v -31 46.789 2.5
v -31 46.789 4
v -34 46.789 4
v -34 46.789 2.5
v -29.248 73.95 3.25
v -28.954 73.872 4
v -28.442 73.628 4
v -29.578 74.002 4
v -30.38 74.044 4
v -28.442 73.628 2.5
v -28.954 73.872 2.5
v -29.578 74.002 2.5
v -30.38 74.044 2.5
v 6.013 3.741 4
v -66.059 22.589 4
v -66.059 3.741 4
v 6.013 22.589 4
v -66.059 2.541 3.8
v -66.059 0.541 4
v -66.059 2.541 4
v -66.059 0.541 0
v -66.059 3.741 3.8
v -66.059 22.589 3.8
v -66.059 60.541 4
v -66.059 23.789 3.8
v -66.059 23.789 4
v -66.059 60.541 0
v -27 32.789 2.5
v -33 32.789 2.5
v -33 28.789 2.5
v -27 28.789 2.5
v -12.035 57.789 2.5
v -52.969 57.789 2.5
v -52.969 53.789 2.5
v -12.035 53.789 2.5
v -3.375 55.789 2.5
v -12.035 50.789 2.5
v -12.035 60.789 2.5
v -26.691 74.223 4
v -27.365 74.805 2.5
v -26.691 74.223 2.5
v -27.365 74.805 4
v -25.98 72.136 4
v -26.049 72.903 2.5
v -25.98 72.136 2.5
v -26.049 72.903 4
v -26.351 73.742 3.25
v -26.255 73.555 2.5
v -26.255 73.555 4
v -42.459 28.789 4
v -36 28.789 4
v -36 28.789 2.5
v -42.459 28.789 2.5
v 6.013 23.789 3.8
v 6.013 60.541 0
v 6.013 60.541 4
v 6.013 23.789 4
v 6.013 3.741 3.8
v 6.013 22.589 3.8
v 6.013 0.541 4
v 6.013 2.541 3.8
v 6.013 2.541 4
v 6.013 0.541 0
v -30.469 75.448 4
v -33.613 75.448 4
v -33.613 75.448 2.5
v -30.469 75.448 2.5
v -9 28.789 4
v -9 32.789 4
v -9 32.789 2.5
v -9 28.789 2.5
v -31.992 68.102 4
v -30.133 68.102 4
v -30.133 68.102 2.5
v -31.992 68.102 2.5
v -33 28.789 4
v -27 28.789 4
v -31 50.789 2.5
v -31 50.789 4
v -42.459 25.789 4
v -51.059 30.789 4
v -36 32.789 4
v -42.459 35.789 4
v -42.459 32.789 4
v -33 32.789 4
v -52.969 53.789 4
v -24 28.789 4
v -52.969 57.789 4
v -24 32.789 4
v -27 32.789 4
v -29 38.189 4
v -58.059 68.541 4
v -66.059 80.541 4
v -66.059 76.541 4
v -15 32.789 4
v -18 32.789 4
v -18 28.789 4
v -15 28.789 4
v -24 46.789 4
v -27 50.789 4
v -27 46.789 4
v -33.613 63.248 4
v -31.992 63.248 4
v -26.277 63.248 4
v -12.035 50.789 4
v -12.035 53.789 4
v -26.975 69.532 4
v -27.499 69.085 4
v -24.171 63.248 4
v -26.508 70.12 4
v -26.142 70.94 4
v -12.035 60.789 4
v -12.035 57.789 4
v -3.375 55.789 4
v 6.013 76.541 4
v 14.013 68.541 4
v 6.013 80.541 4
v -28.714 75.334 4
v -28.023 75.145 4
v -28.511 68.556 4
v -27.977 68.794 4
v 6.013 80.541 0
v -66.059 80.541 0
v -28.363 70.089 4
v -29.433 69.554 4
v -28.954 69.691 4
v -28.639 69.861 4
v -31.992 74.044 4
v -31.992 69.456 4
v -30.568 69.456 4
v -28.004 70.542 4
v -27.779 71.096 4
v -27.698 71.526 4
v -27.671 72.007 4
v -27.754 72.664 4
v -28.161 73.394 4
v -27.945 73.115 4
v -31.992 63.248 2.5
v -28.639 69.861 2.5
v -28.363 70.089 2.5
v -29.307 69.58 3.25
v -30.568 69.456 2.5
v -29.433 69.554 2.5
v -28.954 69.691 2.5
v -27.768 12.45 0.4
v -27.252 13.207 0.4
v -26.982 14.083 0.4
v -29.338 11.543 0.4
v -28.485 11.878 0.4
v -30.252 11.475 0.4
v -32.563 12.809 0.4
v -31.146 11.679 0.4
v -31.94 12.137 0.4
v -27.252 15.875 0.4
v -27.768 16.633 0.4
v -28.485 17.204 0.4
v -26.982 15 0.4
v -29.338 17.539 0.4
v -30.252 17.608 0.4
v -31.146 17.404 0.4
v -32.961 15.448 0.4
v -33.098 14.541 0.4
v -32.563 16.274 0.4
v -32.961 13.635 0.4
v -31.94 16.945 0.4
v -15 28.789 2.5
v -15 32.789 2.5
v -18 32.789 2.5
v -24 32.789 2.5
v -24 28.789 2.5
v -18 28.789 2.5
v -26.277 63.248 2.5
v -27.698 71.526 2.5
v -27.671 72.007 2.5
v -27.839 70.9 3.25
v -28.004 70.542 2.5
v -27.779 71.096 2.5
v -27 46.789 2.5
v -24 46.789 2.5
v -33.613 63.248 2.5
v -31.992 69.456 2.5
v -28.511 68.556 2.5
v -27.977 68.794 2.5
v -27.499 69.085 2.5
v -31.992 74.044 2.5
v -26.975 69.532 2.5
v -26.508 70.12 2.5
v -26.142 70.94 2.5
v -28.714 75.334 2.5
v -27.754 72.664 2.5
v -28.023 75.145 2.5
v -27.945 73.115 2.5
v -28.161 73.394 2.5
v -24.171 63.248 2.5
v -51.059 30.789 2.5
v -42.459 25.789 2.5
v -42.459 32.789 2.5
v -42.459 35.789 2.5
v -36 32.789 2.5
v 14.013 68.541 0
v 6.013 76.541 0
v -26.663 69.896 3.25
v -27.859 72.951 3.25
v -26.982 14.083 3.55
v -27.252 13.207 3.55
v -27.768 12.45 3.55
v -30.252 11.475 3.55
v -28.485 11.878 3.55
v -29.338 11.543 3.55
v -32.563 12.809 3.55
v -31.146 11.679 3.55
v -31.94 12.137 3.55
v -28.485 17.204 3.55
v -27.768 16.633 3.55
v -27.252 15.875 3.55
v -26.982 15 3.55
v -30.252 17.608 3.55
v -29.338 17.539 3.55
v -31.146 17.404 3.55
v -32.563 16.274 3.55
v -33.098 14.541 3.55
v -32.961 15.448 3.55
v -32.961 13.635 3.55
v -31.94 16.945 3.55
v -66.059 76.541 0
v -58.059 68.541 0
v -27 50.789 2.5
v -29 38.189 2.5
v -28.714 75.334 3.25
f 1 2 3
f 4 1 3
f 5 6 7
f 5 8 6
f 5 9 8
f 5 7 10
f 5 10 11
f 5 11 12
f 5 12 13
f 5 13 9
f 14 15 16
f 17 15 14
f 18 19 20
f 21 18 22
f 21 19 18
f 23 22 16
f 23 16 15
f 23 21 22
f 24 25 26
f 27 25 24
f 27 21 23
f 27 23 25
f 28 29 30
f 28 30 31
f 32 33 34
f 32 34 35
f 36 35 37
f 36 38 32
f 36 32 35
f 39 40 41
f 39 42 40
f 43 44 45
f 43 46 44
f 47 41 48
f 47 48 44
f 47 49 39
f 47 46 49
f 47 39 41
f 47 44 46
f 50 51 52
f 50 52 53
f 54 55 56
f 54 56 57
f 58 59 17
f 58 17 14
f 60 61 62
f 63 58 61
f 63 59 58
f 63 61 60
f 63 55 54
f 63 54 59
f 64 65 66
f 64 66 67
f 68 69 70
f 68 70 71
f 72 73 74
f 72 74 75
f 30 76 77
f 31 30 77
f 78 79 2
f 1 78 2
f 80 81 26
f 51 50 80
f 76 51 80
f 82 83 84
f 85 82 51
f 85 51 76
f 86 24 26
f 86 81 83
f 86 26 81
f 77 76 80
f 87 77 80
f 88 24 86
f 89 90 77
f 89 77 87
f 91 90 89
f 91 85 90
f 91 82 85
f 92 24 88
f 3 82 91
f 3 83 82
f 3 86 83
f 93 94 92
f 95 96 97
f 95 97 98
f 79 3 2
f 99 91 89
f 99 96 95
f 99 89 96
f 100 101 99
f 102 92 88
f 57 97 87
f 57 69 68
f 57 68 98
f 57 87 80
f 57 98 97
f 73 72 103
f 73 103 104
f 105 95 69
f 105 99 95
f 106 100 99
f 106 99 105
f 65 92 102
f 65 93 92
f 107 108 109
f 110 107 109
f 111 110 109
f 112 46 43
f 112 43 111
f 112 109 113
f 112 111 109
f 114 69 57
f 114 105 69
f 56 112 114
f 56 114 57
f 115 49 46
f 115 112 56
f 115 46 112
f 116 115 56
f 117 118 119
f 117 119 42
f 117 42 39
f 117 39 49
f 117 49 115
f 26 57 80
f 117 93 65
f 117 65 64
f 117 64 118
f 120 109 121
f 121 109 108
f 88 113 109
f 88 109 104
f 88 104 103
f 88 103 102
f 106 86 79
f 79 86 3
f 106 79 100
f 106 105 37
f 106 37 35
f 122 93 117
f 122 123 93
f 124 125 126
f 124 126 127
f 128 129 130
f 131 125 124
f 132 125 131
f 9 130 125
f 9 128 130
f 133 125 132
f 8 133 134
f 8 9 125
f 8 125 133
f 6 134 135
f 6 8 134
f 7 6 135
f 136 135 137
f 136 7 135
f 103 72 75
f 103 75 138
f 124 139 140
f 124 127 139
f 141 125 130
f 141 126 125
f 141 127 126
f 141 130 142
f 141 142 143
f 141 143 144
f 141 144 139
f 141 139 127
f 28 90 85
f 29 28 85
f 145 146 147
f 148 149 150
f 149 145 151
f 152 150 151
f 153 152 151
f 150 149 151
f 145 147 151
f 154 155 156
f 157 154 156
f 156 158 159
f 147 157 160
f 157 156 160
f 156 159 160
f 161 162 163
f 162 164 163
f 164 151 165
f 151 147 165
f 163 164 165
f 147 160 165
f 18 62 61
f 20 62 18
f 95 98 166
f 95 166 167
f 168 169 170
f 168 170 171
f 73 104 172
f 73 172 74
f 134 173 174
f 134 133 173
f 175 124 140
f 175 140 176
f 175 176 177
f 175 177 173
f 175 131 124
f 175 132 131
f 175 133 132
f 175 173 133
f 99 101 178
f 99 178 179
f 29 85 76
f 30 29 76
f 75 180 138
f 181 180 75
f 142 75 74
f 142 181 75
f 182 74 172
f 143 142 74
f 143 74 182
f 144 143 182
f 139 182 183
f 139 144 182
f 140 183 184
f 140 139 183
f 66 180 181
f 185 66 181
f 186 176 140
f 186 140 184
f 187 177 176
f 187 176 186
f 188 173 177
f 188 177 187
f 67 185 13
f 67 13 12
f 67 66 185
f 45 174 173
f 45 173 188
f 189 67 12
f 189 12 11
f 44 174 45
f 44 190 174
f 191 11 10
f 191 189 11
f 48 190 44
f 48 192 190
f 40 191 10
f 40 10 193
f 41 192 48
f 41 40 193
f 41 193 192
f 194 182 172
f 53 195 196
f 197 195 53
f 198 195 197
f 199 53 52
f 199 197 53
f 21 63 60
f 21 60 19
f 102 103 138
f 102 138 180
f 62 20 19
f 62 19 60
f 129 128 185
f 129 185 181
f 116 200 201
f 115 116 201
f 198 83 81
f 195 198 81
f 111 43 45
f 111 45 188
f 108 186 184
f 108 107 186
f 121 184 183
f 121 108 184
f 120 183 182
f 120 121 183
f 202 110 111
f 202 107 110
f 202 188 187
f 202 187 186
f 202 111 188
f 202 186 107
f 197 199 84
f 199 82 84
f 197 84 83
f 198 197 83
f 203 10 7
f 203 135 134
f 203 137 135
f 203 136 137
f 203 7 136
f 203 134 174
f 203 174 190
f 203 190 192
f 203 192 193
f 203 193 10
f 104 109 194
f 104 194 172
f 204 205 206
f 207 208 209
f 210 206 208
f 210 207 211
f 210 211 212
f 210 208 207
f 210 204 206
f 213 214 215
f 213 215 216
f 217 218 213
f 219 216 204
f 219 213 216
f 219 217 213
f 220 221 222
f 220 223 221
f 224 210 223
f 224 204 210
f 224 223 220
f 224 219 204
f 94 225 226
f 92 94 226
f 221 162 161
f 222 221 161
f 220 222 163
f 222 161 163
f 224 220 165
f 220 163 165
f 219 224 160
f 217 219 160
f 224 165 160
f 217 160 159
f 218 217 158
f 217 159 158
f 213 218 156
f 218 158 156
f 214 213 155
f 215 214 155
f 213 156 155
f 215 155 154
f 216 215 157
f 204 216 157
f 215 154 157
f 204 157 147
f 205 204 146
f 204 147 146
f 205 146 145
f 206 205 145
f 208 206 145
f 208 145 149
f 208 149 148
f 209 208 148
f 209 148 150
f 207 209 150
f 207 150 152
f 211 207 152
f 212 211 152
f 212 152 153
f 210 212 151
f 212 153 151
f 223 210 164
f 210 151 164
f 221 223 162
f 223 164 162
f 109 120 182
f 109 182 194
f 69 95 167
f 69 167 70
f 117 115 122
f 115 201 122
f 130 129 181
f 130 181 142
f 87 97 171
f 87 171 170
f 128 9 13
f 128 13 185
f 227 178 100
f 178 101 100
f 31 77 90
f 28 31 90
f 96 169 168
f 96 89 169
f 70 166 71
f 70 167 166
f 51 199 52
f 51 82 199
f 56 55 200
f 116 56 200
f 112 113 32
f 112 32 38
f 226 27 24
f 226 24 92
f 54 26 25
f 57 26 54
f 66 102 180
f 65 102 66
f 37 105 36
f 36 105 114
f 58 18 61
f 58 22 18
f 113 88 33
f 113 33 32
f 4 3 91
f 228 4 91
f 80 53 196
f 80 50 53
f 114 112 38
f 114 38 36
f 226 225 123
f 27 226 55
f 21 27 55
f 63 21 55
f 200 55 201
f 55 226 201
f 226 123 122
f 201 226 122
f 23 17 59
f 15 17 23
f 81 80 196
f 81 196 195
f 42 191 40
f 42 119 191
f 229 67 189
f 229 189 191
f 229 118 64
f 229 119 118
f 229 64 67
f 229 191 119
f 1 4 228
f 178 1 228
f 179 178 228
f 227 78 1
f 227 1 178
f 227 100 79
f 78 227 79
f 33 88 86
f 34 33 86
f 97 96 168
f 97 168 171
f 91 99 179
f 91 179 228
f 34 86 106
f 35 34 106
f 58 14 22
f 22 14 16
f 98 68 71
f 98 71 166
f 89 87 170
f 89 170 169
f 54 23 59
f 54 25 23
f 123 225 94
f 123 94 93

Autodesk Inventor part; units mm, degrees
ref_plane "YZ Plane" through (0, 0, 0) normal (1, 0, 0) x (0, 1, 0)
ref_plane "XZ Plane" through (0, 0, 0) normal (0, 1, 0) x (-1, 0, 0)
sketch "Sketch1" plane through (0, 0, 0) normal (0, 0, 1) x (1, 0, 0)
  line L0 (6.0134, 0.5413) -> (-66.0587, 0.5413)
  circle A0 centre (-66.0587, 68.5413) radius 8 construction
  line L1 (-66.0587, 60.5413) -> (6.0134, 60.5413) construction
  line L2 (-66.0587, 76.5413) -> (-58.0587, 68.5413)
  line L3 (-66.0587, 60.5413) -> (-58.0587, 68.5413)
  line L4 (6.0134, 60.5413) -> (6.0134, 0.5413)
  line L5 (-66.0587, 0.5413) -> (-66.0587, 60.5413)
  line L6 (-66.0587, 76.5413) -> (-66.0587, 80.5413)
  line L7 (6.0134, 0.5413) -> (-120, 0.5413) construction
  line L8 (-60, 0) -> (-60, 75) construction
  line L9 (-60, 75) -> (0, 75) construction
  line L10 (6.0134, 150.5413) -> (6.0134, 0.5413) construction
  line L11 (6.0134, 60.5413) -> (6.0134, 80.5413)
  line L12 (-66.0587, 80.5413) -> (6.0134, 80.5413)
  line L13 (-66.0587, 76.5413) -> (12.8048, 76.5413) construction
  line L14 (-58.0587, 68.5413) -> (17.3629, 68.5413) construction
  line L15 (-66.0587, 60.5413) -> (24.3855, 60.5413) construction
  circle A1 centre (6.0134, 68.5413) radius 8 construction
  line L16 (6.0134, 60.5413) -> (14.0134, 68.5413)
  line L17 (14.0134, 68.5413) -> (6.0134, 76.5413)
  point P0 (0, 0)
  dimension "d1" = 80
  dimension "d5" = 16
  dimension "d6" = 60
extrude "Extrusion1" add sketch "Sketch1" along normal blind 4
sketch "Sketch3" plane through (0, 0, 4) normal (0, 0, 1) x (1, 0, 0)
  line L0 (-66.0587, 80.5413) -> (13.9413, 80.5413) construction
  line L1 (-34.8487, 75.4475) -> (-28.5043, 75.4475) construction
  line L2 (-28.5043, 75.4475) -> (-28.5043, 84.7097) construction
  line L3 (-28.5043, 84.7097) -> (-34.8487, 84.7097) construction
  line L4 (-34.8487, 84.7097) -> (-34.8487, 75.4475) construction
  line L5 (-52.9694, 57.7889) -> (-12.0353, 57.7889)
  line L6 (-12.0353, 57.7889) -> (-12.0353, 60.7889)
  line L7 (-12.0353, 60.7889) -> (-3.3751, 55.7889)
  line L8 (-12.0353, 50.7889) -> (-3.3751, 55.7889)
  line L9 (-12.0353, 50.7889) -> (-12.0353, 53.7889)
  line L10 (-52.9694, 53.7889) -> (-12.0353, 53.7889)
  line L11 (-52.9694, 57.7889) -> (-52.9694, 53.7889)
  line L12 (-27, 50.7889) -> (-31, 50.7889)
  line L13 (-31, 50.7889) -> (-31, 46.7889)
  line L14 (-27, 46.7889) -> (-27, 50.7889)
  line L15 (-27, 50.7889) -> (-27, 52.7889) construction
  line L16 (-27, 35.7889) -> (-27, 32.7889) construction
  line L17 (-27, 32.7889) -> (-33, 32.7889)
  line L18 (-33, 32.7889) -> (-33, 28.7889)
  line L19 (-33, 28.7889) -> (-27, 28.7889)
  line L20 (-27, 28.7889) -> (-27, 32.7889)
  line L21 (-33, 32.7889) -> (-36, 32.7889) construction
  line L22 (-36, 32.7889) -> (-36, 28.7889)
  line L23 (-36, 32.7889) -> (-42.4587, 32.7889)
  line L24 (-42.4587, 32.7889) -> (-42.4587, 35.7889)
  line L25 (-42.4587, 35.7889) -> (-51.0587, 30.7889)
  line L26 (-36, 28.7889) -> (-42.4587, 28.7889)
  line L27 (-42.4587, 28.7889) -> (-42.4587, 25.7889)
  line L28 (-42.4587, 25.7889) -> (-51.0587, 30.7889)
  line L29 (6.0134, 0.5413) -> (-66.0587, 0.5413) construction
  line L30 (-66.0587, 80.5413) -> (6.0134, 80.5413) construction
  line L31 (-30.0226, 80.5413) -> (-30.0226, 0.5413) construction
  line L32 (-24, 32.7889) -> (-18, 32.7889)
  line L33 (-18, 32.7889) -> (-18, 28.7889)
  line L34 (-18, 28.7889) -> (-24, 28.7889)
  line L35 (-24, 28.7889) -> (-24, 32.7889)
  line L36 (-15, 32.7889) -> (-9, 32.7889)
  line L37 (-9, 32.7889) -> (-9, 28.7889)
  line L38 (-9, 28.7889) -> (-15, 28.7889)
  line L39 (-15, 28.7889) -> (-15, 32.7889)
  line L40 (-27, 46.7889) -> (-24, 46.7889)
  line L41 (-31, 46.7889) -> (-34, 46.7889)
  line L42 (-66.0587, 0.5413) -> (-66.0587, 60.5413) construction
  line L43 (6.0134, 60.5413) -> (6.0134, 0.5413) construction
  line L44 (-29, 50.7889) -> (-29, 38.1889) construction
  line L45 (-34, 46.7889) -> (-29, 38.1889)
  line L46 (-24, 46.7889) -> (-29, 38.1889)
  line L47 (-24.1712, 63.2475) -> (-26.277, 63.2475)
  line L48 (-26.277, 63.2475) -> (-30.1328, 68.1018)
  line L49 (-30.1328, 68.1018) -> (-31.9915, 68.1018)
  line L50 (-31.9915, 68.1018) -> (-31.9915, 63.2475)
  line L51 (-31.9915, 63.2475) -> (-33.6129, 63.2475)
  line L52 (-33.6129, 63.2475) -> (-33.6129, 75.4475)
  line L53 (-33.6129, 75.4475) -> (-30.4689, 75.4475)
  spline S0 degree 2 poles (-30.4689, 75.4475) (-29.421, 75.4475) (-28.0072, 75.2201) (-27.3646, 74.8048) knots 0 0 0 1 2 2 2
  spline S1 degree 2 poles (-27.3646, 74.8048) (-26.7219, 74.3896) (-25.9804, 73.0945) (-25.9804, 72.1355) knots 0 0 0 1 2 2 2
  spline S2 degree 2 poles (-25.9804, 72.1355) (-25.9804, 70.8008) (-27.3448, 68.9915) (-28.5114, 68.5565) knots 0 0 0 1 2 2 2
  line L54 (-28.5114, 68.5565) -> (-24.1712, 63.2475)
  spline S3 degree 2 poles (-27.671, 72.0069) (-27.671, 72.5408) (-28.0467, 73.3614) (-28.4422, 73.6283) knots 0 0 0 1 2 2 2
  spline S4 degree 2 poles (-28.4422, 73.6283) (-28.7882, 73.8557) (-29.7077, 74.0436) (-30.38, 74.0436) knots 0 0 0 1 2 2 2
  line L55 (-30.38, 74.0436) -> (-31.9915, 74.0436)
  line L56 (-31.9915, 74.0436) -> (-31.9915, 69.4562)
  line L57 (-31.9915, 69.4562) -> (-30.5678, 69.4562)
  spline S5 degree 2 poles (-30.5678, 69.4562) (-29.8659, 69.4562) (-28.7487, 69.7034) (-28.3631, 70.089) knots 0 0 0 1 2 2 2
  spline S6 degree 2 poles (-28.3631, 70.089) (-28.0072, 70.4251) (-27.671, 71.3742) (-27.671, 72.0069) knots 0 0 0 1 2 2 2
  point P0 (-26.0587, 80.5413)
  point P1 (-12.0353, 60.7889)
  point P2 (-42.4587, 34.2889)
  point P3 (6.0134, 30.5413)
  point P4 (-9, 30.7889)
  point P5 (-25.5, 46.7889)
  dimension "d65" = 4
  dimension "d66" = 3
  dimension "d67" = 10
  dimension "d68" = 3
  dimension "d88" = 4
  dimension "d92" = 6
  dimension "d93" = 4
  dimension "d94" = 3
  dimension "d96" = 3
  dimension "d97" = 3
  dimension "d121" = 6
  dimension "d122" = 4
  dimension "d123" = 6
  dimension "d124" = 3
  dimension "d125" = 3
  dimension "d128" = 3
  dimension "d130" = 4
  dimension "d132" = 3
  dimension "d133" = 3
  dimension "d134" = 8.6
  dimension "d135" = 15
  dimension "d136" = 15.0134
  dimension "d137" = 12.6
  dimension "d138" = 4
extrude "Extrusion3" cut sketch "Sketch3" against normal blind 1.5
ref_plane "Work Plane2" through (0, 0, 0.4) normal (0, 0, -1) x (-1, 0, 0)
sketch "Sketch5" plane through (0, 0, 0.4) normal (0, 0, -1) x (-1, 0, 0)
  line L0 (-13.9413, 80.5413) -> (66.0587, 80.5413) construction
  line L1 (-6.0134, 0.5413) -> (-6.0134, 76.5413) construction
  line L2 (66.0587, 0.5413) -> (-6.0134, 0.5413) construction
  line L3 (66.0587, 60.5413) -> (66.0587, 0.5413) construction
  line L4 (66.0587, 80.5413) -> (66.0587, 76.5413) construction
  line L5 (-6.0134, 0.5413) -> (-6.0134, 60.5413) construction
  line L6 (66.0587, 0.5413) -> (-6.0134, 0.5413) construction
  line L7 (66.0587, 60.5413) -> (66.0587, 0.5413) construction
  line L8 (58.0587, 68.5413) -> (66.0587, 60.5413) construction
  line L9 (66.0587, 76.5413) -> (58.0587, 68.5413) construction
  circle A0 centre (30.0226, 14.5413) radius 3.075
  line L10 (31, 46.7889) -> (31, 50.7889) construction
  line L11 (31, 50.7889) -> (27, 50.7889) construction
  line L12 (27, 50.7889) -> (27, 46.7889) construction
  line L13 (3.3751, 55.7889) -> (12.0353, 50.7889) construction
  line L14 (12.0353, 50.7889) -> (12.0353, 53.7889) construction
  line L15 (12.0353, 53.7889) -> (52.9694, 53.7889) construction
  line L16 (52.9694, 53.7889) -> (52.9694, 57.7889) construction
  line L17 (52.9694, 57.7889) -> (12.0353, 57.7889) construction
  line L18 (12.0353, 57.7889) -> (12.0353, 60.7889) construction
  line L19 (12.0353, 60.7889) -> (3.3751, 55.7889) construction
  line L20 (42.4587, 25.7889) -> (51.0587, 30.7889) construction
  line L21 (51.0587, 30.7889) -> (42.4587, 35.7889) construction
  line L22 (42.4587, 35.7889) -> (42.4587, 32.7889) construction
  line L23 (42.4587, 32.7889) -> (36, 32.7889) construction
  line L24 (36, 32.7889) -> (36, 28.7889) construction
  line L25 (36, 28.7889) -> (42.4587, 28.7889) construction
  line L26 (42.4587, 28.7889) -> (42.4587, 25.7889) construction
  line L27 (27, 28.7889) -> (33, 28.7889) construction
  line L28 (33, 28.7889) -> (33, 32.7889) construction
  line L29 (33, 32.7889) -> (27, 32.7889) construction
  line L30 (27, 32.7889) -> (27, 28.7889) construction
  line L31 (66.0587, 76.5413) -> (66.0587, 80.5413) construction
  line L32 (58.0587, 68.5413) -> (66.0587, 76.5413) construction
  line L33 (66.0587, 60.5413) -> (58.0587, 68.5413) construction
  line L34 (66.0587, 0.5413) -> (66.0587, 60.5413) construction
  line L35 (-6.0134, 0.5413) -> (66.0587, 0.5413) construction
  line L36 (-6.0134, 60.5413) -> (-6.0134, 0.5413) construction
  line L37 (-6.0134, 80.5413) -> (66.0587, 80.5413) projected
  line L38 (66.0587, 80.5413) -> (-6.0134, 80.5413) projected
  line L39 (-6.0134, 76.5413) -> (-6.0134, 80.5413) projected
  line L40 (-14.0134, 68.5413) -> (-6.0134, 76.5413) projected
  line L41 (-6.0134, 60.5413) -> (-14.0134, 68.5413) projected
  line L42 (-14.0134, 68.5413) -> (-6.0134, 60.5413) projected
  line L43 (-6.0134, 76.5413) -> (-14.0134, 68.5413) projected
  line L44 (-6.0134, 80.5413) -> (-6.0134, 76.5413) projected
  line L45 (27, 46.7889) -> (24, 46.7889) projected
  line L46 (24, 46.7889) -> (29, 38.1889) projected
  line L47 (29, 38.1889) -> (34, 46.7889) projected
  line L48 (34, 46.7889) -> (31, 46.7889) projected
  dimension "d99" = 80
  dimension "d100" = 72.0721
  dimension "d101" = 6.15
  dimension "d102" = 14
  dimension "d103" = 36.036
extrude "Extrusion4" cut sketch "Sketch5" against normal blind 3.15
sketch "Sketch7" plane through (0, 0, 4) normal (0, 0, 1) x (1, 0, 0)
  line L0 (-66.0587, 0.5413) -> (-66.0587, 60.5413) construction
  line L1 (6.0134, 0.5413) -> (-66.0587, 0.5413) construction
  line L2 (6.0134, 80.5413) -> (6.0134, 0.5413) construction
  line L3 (-58.2371, 23.7889) -> (9.8349, 23.7889)
  line L4 (6.0134, 2.5413) -> (-64.0587, 2.5413)
  line L5 (7.8349, 22.5889) -> (-56.2371, 22.5889)
  line L6 (-62.0587, 3.7413) -> (2.0134, 3.7413)
  line L7 (-56.2371, 22.5889) -> (-58.2371, 22.5889)
  line L8 (7.8349, 22.5889) -> (9.8349, 22.5889)
  line L9 (2.0134, 3.7413) -> (4.0134, 3.7413)
  line L10 (-62.0587, 3.7413) -> (-64.0587, 3.7413)
  line L11 (-58.2371, 23.7889) -> (-66.0587, 23.7889)
  line L12 (-58.2371, 22.5889) -> (-66.0587, 22.5889)
  line L13 (-66.0587, 23.7889) -> (-66.0587, 22.5889)
  line L14 (-64.0587, 3.7413) -> (-66.0587, 3.7413)
  line L15 (-64.0587, 2.5413) -> (-66.0587, 2.5413)
  line L16 (-66.0587, 3.7413) -> (-66.0587, 2.5413)
  line L17 (9.8349, 23.7889) -> (6.0134, 23.7889)
  line L18 (9.8349, 22.5889) -> (6.0134, 22.5889)
  line L19 (6.0134, 23.7889) -> (6.0134, 22.5889)
  line L20 (4.0134, 3.7413) -> (6.0134, 3.7413)
  line L21 (6.0134, 3.7413) -> (6.0134, 2.5413)
  point P0 (-42.4587, 25.7889)
  point P1 (6.0134, 60.5413)
  point P2 (0, 0)
  dimension "d115" = 2
  dimension "d116" = 2
  dimension "d117" = 1.2
  dimension "d120" = 1.2
extrude "Extrusion5" cut sketch "Sketch7" against normal blind 0.2
sketch "Sketch8" plane through (-66.0587, 0.5413, 0) normal (0, -1, 0) x (1, 0, 0)
  line L0 (72.0721, 4) -> (0, 4) construction
  line L1 (0, 0) -> (0, 4) construction
  line L2 (0, 0) -> (72.0721, 0) construction
  line L3 (72.0721, 0) -> (72.0721, 4) construction
  line L4 (72.0721, 4) -> (0, 4) construction
  line L5 (0, 0) -> (0, 4) construction
  line L6 (0, 0) -> (72.0721, 0) construction
  line L7 (72.0721, 0) -> (72.0721, 4) construction
  point P0 (66.0587, 0)
properties part number "MS_R[203] text 80x60"
